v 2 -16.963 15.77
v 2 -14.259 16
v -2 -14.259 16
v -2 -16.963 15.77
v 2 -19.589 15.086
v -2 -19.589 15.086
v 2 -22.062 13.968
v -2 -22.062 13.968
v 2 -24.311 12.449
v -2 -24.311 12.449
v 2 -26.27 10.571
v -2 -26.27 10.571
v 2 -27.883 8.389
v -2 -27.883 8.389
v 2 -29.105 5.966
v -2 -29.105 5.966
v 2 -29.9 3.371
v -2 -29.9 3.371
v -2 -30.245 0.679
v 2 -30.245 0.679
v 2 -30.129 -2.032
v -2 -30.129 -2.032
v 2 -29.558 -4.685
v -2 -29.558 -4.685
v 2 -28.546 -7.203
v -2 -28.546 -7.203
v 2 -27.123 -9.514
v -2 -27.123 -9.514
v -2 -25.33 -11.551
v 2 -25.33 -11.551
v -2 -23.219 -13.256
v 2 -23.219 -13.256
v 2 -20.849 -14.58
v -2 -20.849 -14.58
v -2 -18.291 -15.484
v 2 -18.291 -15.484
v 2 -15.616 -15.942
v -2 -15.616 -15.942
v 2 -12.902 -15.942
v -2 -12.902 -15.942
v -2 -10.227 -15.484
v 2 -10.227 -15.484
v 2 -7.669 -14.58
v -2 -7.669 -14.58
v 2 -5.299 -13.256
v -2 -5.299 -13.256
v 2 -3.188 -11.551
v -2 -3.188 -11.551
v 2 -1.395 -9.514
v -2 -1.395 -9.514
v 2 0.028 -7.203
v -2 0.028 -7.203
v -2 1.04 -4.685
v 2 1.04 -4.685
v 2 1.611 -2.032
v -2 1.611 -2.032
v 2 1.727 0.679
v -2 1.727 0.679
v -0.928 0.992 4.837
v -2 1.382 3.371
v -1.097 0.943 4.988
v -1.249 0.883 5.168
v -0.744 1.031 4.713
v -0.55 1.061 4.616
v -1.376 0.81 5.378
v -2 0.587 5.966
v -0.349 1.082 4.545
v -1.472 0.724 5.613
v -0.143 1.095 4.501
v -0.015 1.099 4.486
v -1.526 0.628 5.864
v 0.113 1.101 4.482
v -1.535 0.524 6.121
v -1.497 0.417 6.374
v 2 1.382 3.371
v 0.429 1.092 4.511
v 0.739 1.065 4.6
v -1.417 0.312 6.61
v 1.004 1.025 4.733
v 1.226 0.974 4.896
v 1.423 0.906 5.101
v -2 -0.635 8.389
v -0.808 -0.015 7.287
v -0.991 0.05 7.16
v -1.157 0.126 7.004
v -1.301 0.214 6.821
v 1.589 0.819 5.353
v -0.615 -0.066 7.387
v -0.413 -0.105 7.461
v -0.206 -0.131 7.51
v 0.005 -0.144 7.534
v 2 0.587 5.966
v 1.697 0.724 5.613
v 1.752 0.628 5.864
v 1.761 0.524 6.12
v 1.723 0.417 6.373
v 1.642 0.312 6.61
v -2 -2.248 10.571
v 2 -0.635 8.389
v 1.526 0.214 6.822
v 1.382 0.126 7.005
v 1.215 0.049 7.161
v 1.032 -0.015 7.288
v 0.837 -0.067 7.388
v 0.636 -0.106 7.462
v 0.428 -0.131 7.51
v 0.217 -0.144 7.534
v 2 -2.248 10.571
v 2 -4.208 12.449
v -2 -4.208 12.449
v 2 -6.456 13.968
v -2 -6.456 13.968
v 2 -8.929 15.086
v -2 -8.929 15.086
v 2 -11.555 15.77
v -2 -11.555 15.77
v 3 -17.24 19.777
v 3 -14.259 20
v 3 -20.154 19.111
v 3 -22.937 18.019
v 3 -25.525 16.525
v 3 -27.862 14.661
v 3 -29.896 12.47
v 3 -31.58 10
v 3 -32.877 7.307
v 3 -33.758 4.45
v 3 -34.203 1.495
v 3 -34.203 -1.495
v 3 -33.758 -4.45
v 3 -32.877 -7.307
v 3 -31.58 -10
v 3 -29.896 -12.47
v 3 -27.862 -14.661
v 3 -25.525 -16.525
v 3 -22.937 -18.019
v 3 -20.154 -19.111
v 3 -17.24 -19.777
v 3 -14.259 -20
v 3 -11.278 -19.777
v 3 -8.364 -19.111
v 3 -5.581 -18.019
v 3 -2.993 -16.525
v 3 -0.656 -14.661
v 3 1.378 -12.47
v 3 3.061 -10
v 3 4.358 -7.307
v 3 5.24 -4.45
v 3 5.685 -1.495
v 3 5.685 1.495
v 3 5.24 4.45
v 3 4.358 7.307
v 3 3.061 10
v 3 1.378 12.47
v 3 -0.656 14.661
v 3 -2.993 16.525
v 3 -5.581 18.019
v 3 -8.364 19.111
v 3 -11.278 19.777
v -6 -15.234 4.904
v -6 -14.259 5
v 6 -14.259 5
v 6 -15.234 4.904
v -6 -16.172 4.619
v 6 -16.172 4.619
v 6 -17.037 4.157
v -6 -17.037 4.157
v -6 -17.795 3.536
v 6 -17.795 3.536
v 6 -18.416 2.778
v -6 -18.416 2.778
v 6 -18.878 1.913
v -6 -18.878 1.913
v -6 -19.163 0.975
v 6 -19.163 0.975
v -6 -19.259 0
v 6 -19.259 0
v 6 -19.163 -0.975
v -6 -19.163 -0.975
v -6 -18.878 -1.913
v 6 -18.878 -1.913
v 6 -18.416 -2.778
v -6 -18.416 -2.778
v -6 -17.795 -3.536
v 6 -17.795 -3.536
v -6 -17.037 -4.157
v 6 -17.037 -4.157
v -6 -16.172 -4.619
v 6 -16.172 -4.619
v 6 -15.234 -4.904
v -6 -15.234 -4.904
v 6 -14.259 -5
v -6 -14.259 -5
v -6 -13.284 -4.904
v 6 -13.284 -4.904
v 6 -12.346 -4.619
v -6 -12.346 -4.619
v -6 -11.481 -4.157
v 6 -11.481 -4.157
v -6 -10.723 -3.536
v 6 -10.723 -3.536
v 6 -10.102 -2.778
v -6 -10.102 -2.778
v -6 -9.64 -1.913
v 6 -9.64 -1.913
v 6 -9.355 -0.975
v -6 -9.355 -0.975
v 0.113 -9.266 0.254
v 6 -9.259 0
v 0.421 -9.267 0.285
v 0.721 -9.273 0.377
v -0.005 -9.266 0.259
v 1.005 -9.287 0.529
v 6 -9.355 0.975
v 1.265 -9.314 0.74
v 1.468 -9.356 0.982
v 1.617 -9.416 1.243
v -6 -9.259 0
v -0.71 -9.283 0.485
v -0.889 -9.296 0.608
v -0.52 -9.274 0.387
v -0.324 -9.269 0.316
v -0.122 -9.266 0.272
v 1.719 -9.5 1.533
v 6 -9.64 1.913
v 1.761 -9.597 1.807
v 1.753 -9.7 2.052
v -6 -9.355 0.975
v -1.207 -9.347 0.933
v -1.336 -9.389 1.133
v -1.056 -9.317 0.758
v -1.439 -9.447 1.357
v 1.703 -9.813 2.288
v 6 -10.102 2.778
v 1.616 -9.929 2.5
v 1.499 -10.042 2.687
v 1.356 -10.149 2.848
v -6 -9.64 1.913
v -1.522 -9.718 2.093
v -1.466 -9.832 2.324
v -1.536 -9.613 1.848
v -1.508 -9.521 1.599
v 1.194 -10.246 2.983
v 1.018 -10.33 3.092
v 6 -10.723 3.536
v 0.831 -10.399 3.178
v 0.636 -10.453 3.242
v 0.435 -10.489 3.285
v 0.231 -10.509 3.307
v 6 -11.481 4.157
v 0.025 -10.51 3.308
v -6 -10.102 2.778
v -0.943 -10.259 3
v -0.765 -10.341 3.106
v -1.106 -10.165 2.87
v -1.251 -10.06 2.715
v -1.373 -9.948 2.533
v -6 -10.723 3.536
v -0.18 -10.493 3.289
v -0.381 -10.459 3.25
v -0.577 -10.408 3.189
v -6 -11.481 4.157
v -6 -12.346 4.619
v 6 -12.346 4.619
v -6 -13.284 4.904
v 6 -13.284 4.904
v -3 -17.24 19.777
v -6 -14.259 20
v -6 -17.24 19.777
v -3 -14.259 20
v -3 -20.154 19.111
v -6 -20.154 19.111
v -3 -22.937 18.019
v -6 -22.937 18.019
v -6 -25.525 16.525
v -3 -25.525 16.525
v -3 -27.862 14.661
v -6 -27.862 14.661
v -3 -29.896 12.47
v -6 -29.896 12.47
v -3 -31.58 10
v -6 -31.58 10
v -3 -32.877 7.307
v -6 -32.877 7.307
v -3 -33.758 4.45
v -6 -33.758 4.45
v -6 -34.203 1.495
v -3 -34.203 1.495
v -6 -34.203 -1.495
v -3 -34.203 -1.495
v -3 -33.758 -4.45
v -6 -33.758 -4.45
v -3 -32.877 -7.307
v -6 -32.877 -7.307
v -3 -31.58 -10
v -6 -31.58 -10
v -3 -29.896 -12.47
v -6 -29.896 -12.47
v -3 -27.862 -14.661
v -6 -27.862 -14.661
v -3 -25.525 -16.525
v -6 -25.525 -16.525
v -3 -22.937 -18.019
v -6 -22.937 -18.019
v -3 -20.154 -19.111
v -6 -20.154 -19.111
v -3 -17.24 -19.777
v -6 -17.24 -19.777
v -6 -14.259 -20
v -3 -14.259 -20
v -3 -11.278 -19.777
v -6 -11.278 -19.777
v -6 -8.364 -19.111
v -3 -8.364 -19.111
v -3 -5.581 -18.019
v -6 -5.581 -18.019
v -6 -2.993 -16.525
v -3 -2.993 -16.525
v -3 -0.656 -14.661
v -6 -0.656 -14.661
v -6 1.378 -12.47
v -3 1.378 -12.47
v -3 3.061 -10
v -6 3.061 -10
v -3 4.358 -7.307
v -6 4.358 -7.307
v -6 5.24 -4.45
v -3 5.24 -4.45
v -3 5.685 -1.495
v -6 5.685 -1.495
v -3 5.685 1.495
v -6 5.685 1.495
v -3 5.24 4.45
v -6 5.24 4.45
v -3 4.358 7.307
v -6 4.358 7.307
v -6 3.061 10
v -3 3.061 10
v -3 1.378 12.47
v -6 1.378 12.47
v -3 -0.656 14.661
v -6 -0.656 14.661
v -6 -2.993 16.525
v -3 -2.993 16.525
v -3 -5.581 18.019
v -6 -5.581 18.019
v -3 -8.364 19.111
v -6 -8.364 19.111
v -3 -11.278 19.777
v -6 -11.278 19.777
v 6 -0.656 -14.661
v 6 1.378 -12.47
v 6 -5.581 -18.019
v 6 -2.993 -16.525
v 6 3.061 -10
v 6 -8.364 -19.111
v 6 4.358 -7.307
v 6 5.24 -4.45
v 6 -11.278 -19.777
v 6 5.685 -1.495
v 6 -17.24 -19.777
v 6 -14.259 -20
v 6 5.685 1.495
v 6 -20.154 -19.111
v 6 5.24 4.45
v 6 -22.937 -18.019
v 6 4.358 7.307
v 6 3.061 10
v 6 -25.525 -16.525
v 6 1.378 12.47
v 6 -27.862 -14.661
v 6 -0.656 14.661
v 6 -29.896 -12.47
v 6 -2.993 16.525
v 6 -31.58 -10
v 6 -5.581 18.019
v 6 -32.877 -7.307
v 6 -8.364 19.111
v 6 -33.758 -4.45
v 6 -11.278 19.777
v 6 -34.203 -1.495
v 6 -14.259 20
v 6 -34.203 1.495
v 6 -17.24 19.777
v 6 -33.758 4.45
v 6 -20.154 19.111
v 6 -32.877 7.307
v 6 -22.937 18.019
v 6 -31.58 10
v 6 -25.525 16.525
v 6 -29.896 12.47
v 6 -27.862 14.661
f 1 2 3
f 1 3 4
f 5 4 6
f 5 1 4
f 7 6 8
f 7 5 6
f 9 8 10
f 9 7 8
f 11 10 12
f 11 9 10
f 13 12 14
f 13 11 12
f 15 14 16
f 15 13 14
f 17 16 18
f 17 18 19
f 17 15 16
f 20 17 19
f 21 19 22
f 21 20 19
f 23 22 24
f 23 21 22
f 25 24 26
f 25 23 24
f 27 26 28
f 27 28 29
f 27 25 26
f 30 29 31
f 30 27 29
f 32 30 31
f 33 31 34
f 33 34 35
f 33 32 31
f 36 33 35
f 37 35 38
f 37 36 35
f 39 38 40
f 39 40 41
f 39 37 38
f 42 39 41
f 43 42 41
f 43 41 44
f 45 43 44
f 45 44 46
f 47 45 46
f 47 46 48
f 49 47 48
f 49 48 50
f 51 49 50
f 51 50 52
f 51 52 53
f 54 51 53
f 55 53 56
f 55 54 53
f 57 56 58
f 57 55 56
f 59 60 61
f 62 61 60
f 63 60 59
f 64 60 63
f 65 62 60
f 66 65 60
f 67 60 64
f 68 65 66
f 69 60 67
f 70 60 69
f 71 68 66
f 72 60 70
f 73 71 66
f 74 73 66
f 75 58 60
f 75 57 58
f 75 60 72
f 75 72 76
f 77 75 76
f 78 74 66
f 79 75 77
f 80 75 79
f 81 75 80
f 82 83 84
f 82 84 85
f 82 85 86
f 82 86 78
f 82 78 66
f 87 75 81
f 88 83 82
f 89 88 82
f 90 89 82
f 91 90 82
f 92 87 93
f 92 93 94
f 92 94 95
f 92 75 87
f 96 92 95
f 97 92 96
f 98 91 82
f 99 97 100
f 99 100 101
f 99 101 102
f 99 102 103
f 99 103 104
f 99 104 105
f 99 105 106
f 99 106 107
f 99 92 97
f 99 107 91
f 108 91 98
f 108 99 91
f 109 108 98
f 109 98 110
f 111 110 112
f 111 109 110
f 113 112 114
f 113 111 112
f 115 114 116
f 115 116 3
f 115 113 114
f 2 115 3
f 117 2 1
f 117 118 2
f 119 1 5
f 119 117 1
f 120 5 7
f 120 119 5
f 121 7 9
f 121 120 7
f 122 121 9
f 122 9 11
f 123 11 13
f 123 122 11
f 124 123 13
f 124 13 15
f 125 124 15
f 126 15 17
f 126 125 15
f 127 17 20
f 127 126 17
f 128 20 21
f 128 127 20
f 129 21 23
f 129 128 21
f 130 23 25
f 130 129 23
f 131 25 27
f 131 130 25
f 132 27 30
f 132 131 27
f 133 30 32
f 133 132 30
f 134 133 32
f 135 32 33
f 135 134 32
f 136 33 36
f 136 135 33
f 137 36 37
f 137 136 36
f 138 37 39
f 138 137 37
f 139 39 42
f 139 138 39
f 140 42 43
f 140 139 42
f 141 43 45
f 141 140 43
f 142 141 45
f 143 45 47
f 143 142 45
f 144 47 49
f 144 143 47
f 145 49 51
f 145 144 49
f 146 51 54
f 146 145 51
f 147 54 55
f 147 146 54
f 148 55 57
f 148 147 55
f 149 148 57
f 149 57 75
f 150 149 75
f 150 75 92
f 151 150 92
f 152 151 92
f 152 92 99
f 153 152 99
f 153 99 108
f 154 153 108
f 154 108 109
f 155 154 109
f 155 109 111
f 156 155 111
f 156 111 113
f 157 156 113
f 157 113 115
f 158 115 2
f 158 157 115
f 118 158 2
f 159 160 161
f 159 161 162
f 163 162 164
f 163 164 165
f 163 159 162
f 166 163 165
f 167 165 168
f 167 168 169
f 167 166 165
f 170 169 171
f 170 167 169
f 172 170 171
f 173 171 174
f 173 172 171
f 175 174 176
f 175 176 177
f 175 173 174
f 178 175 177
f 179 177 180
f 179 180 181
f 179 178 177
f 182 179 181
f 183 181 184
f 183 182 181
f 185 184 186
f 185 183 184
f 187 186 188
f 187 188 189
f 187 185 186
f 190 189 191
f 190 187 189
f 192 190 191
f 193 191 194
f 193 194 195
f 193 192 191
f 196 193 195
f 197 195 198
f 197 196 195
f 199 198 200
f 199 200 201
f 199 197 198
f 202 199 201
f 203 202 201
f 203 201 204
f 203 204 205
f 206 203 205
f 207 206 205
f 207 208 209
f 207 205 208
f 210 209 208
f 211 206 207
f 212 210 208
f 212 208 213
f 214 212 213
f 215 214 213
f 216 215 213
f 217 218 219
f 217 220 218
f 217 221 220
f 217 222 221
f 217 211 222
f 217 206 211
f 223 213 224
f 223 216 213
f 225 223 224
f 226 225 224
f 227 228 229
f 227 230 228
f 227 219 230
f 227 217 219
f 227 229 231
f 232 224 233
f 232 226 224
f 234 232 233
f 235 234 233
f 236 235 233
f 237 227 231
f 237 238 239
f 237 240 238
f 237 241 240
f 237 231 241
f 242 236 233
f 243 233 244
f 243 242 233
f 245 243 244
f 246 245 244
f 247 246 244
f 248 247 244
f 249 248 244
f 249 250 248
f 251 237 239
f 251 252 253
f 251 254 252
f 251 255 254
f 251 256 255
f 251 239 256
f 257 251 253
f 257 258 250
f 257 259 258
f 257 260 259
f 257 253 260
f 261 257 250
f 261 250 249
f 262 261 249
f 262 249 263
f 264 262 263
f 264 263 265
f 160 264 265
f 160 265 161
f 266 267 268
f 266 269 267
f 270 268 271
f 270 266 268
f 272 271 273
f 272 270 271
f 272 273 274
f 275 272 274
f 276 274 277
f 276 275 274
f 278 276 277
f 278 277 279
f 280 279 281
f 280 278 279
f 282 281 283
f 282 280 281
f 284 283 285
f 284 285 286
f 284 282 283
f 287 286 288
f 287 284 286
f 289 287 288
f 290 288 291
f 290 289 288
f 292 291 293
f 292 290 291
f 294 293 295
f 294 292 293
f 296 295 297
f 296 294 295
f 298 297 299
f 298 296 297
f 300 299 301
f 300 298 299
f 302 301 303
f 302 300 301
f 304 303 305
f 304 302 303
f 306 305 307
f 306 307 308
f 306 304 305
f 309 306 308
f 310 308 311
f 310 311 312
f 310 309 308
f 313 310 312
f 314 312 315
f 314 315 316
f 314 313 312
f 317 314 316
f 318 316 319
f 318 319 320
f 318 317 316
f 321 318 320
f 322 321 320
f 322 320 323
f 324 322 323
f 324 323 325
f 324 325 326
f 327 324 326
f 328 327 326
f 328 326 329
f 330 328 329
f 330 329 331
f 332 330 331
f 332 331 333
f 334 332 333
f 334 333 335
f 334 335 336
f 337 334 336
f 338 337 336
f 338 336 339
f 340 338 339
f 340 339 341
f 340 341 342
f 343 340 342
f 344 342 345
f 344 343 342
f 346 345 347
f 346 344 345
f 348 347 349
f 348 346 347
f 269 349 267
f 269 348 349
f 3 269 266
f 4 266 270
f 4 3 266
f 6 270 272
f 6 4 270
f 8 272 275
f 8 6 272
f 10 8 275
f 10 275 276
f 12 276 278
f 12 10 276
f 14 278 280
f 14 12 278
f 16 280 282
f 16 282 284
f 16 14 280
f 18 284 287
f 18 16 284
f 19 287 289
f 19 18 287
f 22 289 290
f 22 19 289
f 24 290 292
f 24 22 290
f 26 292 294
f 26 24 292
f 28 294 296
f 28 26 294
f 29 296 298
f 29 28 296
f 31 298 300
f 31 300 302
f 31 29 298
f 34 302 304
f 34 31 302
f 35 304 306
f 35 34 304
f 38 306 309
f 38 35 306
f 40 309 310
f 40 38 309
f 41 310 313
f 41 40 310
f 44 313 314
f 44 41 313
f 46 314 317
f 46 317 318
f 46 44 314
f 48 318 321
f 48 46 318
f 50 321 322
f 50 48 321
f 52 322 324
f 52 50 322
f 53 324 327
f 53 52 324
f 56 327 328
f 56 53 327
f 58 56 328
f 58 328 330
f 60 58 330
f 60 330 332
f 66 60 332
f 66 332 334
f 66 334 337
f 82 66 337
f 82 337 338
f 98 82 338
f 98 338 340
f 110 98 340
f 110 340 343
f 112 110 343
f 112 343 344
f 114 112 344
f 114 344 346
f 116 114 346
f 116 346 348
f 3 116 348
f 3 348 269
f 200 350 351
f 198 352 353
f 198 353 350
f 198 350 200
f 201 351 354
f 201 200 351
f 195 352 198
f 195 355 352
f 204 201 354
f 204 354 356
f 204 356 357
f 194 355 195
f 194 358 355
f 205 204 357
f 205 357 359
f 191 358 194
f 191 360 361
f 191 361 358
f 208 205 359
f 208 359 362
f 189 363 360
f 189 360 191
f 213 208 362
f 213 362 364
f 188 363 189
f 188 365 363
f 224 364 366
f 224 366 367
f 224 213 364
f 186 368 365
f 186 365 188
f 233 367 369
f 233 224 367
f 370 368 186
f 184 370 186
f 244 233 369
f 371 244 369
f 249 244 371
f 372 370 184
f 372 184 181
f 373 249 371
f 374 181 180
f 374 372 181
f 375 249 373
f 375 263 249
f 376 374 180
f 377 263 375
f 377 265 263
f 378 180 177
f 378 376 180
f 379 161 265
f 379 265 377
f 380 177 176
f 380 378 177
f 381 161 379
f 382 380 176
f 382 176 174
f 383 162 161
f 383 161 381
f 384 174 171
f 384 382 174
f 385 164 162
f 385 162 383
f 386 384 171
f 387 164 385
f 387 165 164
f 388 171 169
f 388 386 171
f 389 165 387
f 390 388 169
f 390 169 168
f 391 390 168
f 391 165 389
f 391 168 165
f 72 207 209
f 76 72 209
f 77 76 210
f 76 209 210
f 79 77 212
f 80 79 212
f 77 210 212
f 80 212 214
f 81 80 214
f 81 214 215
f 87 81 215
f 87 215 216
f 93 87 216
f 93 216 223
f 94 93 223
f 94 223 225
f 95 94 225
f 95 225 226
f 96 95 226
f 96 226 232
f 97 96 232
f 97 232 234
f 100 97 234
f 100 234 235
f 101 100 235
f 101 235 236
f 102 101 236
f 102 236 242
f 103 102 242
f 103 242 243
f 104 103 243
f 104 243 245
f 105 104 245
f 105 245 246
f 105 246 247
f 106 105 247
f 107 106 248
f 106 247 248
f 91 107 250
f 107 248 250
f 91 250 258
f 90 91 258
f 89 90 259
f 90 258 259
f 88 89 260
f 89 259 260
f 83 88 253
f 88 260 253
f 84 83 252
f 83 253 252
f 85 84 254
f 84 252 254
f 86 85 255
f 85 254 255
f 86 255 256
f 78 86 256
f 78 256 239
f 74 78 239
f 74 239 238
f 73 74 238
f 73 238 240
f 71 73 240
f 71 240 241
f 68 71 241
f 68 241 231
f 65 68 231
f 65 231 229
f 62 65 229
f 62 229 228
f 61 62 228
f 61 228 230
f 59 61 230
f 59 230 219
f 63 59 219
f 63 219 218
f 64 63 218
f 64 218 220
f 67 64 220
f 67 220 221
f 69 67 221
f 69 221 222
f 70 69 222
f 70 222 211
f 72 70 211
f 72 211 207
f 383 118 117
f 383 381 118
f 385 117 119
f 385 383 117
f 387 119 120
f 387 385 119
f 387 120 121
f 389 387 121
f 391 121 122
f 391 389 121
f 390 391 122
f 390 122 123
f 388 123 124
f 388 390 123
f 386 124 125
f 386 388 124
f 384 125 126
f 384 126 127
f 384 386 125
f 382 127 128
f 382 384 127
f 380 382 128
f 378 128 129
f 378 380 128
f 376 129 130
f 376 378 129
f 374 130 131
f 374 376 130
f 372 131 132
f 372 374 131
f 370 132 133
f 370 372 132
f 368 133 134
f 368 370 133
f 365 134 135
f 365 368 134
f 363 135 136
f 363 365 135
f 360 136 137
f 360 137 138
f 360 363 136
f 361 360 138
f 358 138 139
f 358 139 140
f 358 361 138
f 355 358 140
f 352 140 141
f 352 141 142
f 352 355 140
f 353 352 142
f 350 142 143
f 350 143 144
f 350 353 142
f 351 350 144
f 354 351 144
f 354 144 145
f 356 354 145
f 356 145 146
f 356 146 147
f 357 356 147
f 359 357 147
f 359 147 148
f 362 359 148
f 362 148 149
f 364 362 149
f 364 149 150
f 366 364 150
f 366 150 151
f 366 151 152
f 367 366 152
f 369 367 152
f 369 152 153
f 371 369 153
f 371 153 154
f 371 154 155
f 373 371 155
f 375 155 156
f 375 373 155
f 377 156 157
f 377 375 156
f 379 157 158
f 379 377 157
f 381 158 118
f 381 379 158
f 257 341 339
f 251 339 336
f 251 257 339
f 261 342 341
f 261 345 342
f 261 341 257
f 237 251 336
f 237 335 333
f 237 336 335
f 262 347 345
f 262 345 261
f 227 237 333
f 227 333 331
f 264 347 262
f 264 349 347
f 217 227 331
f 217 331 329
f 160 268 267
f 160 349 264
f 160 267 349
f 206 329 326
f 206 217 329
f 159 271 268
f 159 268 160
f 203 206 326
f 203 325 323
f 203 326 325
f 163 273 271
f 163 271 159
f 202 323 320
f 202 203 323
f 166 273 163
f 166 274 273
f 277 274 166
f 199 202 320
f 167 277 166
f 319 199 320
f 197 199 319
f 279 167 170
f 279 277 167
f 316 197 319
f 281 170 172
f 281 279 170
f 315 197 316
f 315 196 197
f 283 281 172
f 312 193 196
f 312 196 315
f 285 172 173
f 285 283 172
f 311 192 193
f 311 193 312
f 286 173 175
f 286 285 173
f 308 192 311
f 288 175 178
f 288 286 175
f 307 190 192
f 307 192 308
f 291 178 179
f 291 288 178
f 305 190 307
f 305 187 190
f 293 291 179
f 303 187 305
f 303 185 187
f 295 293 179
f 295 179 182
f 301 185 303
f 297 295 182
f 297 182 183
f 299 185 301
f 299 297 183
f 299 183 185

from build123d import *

# Parameters (mm, degrees)
M4X0_7_TAPPED_HOLE1_D     = 3.3
M4X0_7_TAPPED_HOLE1_DEPTH = 12


with BuildPart() as part:
    # Sketch1 → Revolve1 (revolve)
    with BuildSketch(Plane.XY, mode=Mode.PRIVATE) as revolve1_sk:
        Polygon((-2, 1.740967464), (2, 1.740967464), (3, 5.740967464), (6, 5.740967464), (6, -9.259032536), (-6, -9.259032536), (-6, 5.740967464), (-3, 5.740967464), align=None)
    revolve(revolve1_sk.sketch.rotate(Axis((-24.289514567, -14.259032536, 0), (1, 0, 0)), 90), axis=Axis((-24.289514567, -14.259032536, 0), (1, 0, 0)))

    # M4x0.7 Tapped Hole1
    with Locations(Plane(origin=(0.112968309, 0.556468612, 6.041599599), x_dir=(0, -0.377599974944, 0.925968821787), z_dir=(0, 0.925968821787, 0.377599974944))):
        with Locations((0, 0)):
            Hole(M4X0_7_TAPPED_HOLE1_D / 2, depth=M4X0_7_TAPPED_HOLE1_DEPTH)


solid = part.part
